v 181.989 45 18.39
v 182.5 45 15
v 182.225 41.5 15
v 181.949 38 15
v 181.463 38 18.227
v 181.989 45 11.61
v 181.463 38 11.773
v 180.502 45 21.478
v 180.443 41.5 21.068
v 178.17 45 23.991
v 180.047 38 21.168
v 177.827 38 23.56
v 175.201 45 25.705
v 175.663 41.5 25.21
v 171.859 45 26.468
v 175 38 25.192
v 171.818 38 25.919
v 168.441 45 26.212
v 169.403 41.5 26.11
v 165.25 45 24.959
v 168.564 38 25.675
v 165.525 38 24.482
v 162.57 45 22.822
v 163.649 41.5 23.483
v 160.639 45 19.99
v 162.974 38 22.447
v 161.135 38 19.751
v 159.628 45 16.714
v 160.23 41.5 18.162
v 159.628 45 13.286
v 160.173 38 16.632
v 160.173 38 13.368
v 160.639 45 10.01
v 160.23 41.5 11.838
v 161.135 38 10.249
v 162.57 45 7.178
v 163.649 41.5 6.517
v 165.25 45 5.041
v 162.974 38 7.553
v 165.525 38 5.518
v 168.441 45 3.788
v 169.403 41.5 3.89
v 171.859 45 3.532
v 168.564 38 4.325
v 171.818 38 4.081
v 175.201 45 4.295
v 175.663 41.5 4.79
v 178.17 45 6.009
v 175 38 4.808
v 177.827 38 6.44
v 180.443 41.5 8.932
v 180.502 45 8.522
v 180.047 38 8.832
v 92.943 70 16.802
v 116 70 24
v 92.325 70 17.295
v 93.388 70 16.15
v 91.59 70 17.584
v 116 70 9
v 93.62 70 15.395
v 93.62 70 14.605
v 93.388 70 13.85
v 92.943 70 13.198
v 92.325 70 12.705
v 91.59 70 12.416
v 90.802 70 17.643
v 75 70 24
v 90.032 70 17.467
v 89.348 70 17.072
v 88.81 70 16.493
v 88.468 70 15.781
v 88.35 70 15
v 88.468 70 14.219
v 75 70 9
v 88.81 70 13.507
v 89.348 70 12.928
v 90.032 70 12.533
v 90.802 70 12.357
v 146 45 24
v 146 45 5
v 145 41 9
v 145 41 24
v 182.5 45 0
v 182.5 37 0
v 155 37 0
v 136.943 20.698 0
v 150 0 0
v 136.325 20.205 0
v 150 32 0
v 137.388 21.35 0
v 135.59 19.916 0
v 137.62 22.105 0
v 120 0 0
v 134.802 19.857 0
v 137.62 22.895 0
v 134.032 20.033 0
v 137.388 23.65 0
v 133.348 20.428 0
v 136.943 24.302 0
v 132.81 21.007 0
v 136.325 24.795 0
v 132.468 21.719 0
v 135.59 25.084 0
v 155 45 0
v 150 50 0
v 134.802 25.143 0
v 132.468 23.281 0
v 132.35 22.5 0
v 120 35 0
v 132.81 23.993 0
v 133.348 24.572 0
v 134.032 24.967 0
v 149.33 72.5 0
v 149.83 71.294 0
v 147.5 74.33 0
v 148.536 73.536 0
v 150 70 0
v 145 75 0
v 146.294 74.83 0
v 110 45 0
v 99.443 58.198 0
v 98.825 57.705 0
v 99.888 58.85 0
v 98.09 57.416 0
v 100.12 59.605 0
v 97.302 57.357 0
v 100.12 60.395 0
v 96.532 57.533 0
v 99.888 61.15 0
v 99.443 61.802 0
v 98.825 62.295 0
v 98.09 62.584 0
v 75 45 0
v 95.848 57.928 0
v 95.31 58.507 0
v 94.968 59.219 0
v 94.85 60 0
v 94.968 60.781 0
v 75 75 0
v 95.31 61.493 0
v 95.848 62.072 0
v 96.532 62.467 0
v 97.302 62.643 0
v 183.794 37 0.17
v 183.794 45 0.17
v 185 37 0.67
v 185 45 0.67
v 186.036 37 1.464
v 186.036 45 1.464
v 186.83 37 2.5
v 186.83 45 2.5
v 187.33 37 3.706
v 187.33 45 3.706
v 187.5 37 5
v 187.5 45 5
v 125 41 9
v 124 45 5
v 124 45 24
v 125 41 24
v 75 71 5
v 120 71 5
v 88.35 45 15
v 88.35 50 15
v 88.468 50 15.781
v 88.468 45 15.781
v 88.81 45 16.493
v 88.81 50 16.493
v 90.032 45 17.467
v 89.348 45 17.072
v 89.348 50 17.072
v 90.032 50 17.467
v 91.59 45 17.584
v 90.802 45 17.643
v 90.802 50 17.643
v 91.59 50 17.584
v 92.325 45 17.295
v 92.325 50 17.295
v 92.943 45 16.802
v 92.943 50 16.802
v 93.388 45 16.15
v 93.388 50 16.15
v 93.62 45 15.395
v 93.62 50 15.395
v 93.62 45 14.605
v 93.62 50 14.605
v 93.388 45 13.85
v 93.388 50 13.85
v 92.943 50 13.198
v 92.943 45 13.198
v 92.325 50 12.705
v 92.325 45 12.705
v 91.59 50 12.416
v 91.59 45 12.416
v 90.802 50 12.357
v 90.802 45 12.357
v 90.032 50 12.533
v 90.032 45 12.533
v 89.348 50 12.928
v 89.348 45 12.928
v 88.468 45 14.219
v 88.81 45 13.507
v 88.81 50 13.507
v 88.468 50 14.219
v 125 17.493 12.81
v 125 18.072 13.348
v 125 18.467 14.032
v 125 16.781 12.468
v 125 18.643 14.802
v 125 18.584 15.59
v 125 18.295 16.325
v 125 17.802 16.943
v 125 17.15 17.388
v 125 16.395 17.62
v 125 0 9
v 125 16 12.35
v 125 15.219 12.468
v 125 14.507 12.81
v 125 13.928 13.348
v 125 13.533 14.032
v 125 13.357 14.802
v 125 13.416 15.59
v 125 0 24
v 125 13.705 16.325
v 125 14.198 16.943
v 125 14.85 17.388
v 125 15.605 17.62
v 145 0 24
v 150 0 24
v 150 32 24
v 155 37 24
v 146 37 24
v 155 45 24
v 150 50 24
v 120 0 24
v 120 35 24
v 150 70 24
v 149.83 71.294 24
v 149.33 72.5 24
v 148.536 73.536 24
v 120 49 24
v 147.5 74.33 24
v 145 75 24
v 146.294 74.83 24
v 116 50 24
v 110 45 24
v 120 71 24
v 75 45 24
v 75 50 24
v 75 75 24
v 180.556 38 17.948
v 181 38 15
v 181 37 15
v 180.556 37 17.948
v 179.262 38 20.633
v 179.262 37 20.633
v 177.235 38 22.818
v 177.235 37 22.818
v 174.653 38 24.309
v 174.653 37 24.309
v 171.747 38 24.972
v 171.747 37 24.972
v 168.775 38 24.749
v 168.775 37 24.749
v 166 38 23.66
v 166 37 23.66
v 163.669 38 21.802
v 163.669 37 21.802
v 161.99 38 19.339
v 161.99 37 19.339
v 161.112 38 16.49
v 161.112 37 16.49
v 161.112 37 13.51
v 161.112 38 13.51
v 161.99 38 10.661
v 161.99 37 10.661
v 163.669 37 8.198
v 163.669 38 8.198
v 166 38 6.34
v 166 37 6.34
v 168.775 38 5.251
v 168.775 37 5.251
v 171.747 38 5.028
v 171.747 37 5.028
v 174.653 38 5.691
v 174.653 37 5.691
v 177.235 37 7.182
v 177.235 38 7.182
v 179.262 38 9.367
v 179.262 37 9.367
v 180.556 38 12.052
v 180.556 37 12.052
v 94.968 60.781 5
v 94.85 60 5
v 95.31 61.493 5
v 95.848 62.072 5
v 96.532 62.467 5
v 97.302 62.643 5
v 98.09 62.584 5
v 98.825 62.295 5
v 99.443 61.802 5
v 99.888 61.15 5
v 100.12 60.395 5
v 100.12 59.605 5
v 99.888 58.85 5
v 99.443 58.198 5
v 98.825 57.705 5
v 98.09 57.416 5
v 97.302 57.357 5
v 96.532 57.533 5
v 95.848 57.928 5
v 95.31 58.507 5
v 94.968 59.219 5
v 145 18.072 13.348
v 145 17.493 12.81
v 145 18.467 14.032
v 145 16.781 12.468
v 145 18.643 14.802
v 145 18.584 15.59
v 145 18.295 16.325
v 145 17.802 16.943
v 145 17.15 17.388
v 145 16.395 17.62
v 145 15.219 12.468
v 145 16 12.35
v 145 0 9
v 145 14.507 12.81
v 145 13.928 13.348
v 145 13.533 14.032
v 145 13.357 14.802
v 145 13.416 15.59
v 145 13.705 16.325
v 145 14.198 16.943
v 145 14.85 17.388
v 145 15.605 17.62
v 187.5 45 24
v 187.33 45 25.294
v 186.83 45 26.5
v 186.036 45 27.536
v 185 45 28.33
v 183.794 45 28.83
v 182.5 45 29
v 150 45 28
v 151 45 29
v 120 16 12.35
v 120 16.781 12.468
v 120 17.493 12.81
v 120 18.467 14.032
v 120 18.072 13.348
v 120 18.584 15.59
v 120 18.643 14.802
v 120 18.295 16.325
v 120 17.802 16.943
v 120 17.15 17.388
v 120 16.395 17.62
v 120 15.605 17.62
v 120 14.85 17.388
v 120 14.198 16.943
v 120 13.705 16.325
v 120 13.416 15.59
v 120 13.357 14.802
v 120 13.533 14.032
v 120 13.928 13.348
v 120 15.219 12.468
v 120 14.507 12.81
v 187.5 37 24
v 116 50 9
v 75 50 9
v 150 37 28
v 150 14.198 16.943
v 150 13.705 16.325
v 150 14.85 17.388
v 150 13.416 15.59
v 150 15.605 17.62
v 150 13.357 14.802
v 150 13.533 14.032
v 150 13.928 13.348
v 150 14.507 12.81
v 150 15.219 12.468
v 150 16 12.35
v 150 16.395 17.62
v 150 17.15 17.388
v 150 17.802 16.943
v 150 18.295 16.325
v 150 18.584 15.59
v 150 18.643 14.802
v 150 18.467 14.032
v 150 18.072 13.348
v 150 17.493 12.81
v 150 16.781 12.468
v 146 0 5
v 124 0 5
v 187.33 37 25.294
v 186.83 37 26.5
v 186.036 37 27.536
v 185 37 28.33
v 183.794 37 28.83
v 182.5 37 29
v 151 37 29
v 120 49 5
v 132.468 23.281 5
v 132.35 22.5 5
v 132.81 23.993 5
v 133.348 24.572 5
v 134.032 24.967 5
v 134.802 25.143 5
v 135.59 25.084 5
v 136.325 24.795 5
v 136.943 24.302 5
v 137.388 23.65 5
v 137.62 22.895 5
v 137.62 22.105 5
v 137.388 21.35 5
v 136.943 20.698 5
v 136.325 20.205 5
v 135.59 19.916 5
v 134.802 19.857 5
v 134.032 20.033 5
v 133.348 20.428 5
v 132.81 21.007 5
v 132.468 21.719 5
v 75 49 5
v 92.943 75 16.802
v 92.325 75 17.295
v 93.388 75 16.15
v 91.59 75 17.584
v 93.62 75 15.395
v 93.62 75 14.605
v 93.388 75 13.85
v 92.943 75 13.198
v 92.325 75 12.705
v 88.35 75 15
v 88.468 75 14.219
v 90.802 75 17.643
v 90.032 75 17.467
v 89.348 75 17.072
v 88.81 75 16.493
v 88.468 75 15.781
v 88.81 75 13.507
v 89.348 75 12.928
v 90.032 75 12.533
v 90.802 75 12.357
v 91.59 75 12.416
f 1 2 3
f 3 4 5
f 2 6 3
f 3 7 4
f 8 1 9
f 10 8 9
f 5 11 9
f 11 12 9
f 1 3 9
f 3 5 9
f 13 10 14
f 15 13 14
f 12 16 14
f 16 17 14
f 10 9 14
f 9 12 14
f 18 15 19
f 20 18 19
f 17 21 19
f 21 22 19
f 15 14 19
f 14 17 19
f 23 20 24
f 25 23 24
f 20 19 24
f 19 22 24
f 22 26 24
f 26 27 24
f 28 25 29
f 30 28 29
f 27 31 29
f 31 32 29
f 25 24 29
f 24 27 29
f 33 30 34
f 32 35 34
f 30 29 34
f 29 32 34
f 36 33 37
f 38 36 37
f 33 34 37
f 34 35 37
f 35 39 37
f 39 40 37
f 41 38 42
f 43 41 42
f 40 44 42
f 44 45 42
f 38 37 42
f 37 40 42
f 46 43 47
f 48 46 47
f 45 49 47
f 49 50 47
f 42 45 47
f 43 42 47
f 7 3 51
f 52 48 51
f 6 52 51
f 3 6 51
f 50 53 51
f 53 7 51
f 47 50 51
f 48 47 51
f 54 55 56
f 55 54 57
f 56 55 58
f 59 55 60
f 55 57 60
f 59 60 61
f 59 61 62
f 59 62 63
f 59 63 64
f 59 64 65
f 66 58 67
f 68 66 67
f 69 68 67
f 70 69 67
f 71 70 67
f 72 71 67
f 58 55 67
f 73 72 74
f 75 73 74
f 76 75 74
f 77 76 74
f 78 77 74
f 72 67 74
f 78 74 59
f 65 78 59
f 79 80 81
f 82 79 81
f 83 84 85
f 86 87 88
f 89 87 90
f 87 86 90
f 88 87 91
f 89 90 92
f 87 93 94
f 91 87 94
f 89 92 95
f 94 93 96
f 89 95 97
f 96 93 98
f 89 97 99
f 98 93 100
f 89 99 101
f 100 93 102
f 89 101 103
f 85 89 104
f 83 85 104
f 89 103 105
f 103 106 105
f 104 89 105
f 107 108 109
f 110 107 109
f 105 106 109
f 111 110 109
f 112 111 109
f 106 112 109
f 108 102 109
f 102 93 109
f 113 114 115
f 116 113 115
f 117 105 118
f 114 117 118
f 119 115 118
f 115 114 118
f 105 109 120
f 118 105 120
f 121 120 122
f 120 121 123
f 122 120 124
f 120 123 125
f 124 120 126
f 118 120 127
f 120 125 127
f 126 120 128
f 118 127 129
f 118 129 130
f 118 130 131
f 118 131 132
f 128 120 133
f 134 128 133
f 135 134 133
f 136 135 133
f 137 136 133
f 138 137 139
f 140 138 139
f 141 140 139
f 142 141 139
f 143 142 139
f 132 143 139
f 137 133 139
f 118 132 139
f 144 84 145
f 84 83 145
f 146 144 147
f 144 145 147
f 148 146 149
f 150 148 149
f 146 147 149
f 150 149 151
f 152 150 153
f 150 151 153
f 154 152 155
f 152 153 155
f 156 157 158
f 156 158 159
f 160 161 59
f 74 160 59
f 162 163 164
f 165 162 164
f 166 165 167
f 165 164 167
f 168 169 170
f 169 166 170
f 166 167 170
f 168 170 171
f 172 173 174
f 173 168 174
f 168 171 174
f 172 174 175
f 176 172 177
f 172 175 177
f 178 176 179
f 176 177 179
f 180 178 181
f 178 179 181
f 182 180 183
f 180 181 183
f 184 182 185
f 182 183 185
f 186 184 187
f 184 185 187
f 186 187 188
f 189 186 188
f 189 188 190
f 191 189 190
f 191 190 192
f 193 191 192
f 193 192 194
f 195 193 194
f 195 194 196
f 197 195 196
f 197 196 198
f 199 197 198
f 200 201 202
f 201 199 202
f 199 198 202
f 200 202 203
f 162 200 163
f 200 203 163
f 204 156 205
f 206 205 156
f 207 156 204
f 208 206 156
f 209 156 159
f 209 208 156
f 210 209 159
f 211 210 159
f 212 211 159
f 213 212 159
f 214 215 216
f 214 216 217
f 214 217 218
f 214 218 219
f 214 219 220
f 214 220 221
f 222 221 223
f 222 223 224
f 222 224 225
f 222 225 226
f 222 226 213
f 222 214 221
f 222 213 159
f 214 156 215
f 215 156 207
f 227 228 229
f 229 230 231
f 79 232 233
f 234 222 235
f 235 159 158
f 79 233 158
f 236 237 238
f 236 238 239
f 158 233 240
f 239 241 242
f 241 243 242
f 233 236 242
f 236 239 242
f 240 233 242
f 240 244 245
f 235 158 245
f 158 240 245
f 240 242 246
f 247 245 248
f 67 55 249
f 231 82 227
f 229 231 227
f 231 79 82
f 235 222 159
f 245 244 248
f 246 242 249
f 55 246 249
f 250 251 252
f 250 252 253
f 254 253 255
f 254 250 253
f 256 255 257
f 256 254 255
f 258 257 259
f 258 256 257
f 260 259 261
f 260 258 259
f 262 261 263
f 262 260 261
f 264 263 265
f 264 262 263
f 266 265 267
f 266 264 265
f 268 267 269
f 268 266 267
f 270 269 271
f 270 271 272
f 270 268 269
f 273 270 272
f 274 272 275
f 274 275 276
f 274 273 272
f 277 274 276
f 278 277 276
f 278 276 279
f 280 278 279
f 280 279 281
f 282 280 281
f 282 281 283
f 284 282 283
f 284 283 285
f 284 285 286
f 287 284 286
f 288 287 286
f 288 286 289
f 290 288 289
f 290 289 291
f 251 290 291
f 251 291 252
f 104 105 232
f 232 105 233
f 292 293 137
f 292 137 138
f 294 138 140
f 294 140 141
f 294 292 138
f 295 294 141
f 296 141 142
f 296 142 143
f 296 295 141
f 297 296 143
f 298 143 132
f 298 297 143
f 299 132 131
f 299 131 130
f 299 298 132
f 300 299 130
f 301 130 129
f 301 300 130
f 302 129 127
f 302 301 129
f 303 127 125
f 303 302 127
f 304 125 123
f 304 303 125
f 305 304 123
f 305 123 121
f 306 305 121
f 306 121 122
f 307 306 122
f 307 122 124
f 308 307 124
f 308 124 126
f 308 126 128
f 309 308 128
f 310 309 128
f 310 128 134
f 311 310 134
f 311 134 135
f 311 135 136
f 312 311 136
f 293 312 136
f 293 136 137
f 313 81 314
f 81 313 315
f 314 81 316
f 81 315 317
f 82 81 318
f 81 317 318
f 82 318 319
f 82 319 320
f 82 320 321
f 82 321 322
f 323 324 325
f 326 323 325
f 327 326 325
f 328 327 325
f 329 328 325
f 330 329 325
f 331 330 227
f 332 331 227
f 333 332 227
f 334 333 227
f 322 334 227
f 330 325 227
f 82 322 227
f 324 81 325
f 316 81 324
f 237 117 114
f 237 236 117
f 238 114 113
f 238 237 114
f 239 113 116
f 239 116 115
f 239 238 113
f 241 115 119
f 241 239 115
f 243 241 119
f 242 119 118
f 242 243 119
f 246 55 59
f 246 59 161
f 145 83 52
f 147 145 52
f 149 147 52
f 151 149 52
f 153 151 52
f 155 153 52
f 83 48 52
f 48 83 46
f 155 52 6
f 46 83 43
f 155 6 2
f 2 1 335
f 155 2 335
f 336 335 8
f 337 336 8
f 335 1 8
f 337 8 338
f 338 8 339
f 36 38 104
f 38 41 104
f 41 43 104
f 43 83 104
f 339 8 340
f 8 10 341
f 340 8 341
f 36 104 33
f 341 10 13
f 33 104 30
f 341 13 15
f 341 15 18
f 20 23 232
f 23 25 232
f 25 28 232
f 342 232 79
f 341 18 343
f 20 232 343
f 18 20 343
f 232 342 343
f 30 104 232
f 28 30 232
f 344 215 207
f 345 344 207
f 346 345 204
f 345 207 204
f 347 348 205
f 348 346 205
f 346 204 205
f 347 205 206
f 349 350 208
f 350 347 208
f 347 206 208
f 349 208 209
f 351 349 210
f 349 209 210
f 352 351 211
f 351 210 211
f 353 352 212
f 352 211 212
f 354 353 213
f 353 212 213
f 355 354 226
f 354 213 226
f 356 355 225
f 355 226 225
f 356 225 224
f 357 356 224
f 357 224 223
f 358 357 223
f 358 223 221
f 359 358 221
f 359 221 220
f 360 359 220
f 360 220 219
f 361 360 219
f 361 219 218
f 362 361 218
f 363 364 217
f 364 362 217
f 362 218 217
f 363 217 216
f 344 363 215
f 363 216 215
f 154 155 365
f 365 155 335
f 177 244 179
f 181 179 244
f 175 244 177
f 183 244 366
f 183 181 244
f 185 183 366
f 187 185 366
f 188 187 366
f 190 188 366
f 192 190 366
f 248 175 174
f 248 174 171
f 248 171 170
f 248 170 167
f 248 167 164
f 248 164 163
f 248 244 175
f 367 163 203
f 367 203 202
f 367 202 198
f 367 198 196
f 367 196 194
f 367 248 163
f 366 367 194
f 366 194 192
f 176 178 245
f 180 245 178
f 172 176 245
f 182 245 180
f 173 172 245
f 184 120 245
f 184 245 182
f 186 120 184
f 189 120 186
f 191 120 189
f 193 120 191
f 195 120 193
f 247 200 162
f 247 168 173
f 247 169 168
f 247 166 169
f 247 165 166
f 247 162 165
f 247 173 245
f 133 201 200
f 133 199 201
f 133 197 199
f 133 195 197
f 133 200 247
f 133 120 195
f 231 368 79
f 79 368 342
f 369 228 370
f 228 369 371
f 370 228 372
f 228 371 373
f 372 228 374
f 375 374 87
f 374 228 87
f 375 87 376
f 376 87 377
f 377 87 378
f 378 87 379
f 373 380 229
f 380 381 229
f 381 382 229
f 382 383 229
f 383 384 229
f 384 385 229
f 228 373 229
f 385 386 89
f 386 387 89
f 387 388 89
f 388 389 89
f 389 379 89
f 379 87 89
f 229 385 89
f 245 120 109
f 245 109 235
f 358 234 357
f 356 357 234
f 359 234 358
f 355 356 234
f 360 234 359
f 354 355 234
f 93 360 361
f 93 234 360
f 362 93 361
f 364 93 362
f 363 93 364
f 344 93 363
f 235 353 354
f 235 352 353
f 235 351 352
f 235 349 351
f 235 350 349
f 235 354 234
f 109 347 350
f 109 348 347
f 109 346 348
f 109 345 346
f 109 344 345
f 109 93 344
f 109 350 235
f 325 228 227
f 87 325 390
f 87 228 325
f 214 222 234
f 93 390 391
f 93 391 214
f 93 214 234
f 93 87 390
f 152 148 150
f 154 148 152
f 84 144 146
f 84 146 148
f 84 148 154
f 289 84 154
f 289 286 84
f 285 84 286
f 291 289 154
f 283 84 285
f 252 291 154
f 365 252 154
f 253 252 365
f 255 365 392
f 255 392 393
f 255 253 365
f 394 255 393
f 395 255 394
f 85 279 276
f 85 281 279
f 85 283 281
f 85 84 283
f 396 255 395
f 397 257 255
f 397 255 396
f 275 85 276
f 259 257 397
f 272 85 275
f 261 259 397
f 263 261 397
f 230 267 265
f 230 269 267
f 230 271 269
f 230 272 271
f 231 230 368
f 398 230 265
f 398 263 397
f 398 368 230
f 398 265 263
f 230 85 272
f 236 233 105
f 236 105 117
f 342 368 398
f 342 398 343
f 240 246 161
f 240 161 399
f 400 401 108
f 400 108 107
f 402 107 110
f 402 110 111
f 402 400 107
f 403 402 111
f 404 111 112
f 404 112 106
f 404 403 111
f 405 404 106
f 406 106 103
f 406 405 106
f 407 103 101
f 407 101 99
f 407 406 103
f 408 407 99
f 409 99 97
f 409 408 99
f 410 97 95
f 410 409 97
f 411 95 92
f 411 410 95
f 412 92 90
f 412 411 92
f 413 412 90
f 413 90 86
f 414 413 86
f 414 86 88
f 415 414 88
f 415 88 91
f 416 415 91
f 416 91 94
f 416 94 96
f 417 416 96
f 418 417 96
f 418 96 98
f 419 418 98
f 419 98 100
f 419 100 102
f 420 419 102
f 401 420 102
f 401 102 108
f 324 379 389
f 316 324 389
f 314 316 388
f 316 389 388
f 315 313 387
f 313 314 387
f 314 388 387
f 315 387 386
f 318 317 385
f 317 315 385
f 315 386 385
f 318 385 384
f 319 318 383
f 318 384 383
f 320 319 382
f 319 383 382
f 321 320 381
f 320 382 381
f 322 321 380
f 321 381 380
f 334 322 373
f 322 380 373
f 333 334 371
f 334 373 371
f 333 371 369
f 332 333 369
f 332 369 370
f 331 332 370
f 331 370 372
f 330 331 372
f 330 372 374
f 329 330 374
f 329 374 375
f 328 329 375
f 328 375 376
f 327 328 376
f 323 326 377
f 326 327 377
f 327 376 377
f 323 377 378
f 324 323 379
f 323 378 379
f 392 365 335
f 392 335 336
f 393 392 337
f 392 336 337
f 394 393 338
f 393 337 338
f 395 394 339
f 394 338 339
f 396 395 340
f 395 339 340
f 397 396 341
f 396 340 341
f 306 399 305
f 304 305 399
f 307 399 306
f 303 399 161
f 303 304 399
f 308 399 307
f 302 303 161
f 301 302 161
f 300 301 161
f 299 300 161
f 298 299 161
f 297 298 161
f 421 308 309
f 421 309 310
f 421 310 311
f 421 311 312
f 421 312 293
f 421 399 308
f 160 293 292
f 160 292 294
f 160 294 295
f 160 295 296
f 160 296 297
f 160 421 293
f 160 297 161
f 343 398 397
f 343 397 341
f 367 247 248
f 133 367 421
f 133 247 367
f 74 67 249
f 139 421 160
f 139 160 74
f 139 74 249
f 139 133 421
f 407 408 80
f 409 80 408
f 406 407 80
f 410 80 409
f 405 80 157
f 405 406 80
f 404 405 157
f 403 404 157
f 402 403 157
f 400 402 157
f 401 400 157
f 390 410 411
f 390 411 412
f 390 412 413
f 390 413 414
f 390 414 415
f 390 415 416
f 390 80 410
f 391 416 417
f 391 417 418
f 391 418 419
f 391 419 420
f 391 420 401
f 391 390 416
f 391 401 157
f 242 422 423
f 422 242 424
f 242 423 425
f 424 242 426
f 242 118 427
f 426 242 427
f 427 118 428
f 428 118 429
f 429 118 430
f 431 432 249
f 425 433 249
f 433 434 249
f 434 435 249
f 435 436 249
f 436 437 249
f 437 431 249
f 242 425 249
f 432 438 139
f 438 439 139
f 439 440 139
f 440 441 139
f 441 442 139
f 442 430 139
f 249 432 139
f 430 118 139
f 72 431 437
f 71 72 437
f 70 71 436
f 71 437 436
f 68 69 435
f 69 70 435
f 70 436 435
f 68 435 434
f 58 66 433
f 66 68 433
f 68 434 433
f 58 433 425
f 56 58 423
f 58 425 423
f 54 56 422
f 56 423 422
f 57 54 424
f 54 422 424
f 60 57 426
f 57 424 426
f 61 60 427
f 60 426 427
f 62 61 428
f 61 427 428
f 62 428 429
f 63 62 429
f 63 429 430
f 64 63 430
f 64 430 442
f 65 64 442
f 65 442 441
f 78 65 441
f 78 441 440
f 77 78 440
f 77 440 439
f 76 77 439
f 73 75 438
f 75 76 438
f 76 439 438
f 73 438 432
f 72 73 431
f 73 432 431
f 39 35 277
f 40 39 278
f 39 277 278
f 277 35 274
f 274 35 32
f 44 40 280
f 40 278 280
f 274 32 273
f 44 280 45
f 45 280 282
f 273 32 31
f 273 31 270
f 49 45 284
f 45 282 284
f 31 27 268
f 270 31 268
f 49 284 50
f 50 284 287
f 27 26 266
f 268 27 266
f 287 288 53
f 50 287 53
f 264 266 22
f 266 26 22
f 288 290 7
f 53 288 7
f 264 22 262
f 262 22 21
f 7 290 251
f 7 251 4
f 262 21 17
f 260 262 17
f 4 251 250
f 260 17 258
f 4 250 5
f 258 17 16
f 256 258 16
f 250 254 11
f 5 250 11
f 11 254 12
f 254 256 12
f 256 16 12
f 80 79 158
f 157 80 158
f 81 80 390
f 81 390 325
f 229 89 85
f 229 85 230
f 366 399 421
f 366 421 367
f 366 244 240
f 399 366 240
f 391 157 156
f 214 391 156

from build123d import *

# Parameters (mm, degrees)
SKETCH1_W               = 75
SKETCH1_H               = 75
BOSS_EXTRUDE1_DEPTH     = 24
SKETCH2_W               = 20
SKETCH2_H               = 19
CUT_EXTRUDE1_DEPTH      = 45
SKETCH3_W               = 19
SKETCH3_H               = 20
CUT_EXTRUDE2_DEPTH      = 45
CUT_EXTRUDE3_DEPTH      = 109.747413762
CUT_EXTRUDE3_DEPTH_BACK = 109.747413762
SKETCH4_W               = 45
SKETCH4_H               = 45
FILLET1_R               = 5
CHAMFER1_SIZE           = 10
SKETCH5_W               = 29
SKETCH5_H               = 8
BOSS_EXTRUDE2_DEPTH     = 37.5
SKETCH6_R               = 11.5
CUT_EXTRUDE4_DEPTH      = 7
FILLET2_R               = 5
CHAMFER3_SIZE           = 5
CUT_EXTRUDE5_DEPTH      = 93.146622293
CUT_EXTRUDE5_DEPTH_BACK = 93.146622293
SKETCH7_R               = 2.65
CUT_EXTRUDE6_DEPTH      = 105.986903945
CUT_EXTRUDE6_DEPTH_BACK = 105.986903945
SKETCH8_R               = 2.65
SKETCH9_R               = 2.65
CUT_EXTRUDE7_DEPTH      = 10
SKETCH10_R              = 2.65
CUT_EXTRUDE8_DEPTH      = 10
CUT_EXTRUDE12_DEPTH     = 19
CUT_EXTRUDE13_REACH     = 111.959
CUT_EXTRUDE14_REACH     = 140.283
SKETCH14_R              = 10
CUT_EXTRUDE15_DEPTH     = 10
CHAMFER5_SIZE           = 4
CHAMFER6_SIZE           = 1
CHAMFER8_SIZE2          = 0.550911948
CHAMFER8_SIZE           = 7


with BuildPart() as part:
    # Sketch1 → Boss-Extrude1 (new body)
    with BuildSketch(Plane.XY):
        with Locations((37.5, 37.5)):
            Rectangle(SKETCH1_W, SKETCH1_H)
    extrude(amount=BOSS_EXTRUDE1_DEPTH)

    # Sketch2 → Cut-Extrude1 (cut)
    with BuildSketch(Plane.XZ):
        with Locations((15, 14.5)):
            Rectangle(SKETCH2_W, SKETCH2_H)
    extrude(amount=-CUT_EXTRUDE1_DEPTH, mode=Mode.SUBTRACT)

    # Sketch3 → Cut-Extrude2 (cut)
    with BuildSketch(Plane(origin=(75, 0, 0), x_dir=(0, 0, -1), z_dir=(1, 0, 0))):
        with Locations((-14.5, 60)):
            Rectangle(SKETCH3_W, SKETCH3_H)
    extrude(amount=-CUT_EXTRUDE2_DEPTH, mode=Mode.SUBTRACT)

    # Sketch4 → Cut-Extrude3 (cut, two sides: drawn at the far end of the back side and taken through both)
    with BuildSketch(Plane.XY.offset(24).offset(-CUT_EXTRUDE3_DEPTH_BACK)):
        with Locations((52.5, 22.5)):
            Rectangle(SKETCH4_W, SKETCH4_H)
    extrude(amount=CUT_EXTRUDE3_DEPTH + CUT_EXTRUDE3_DEPTH_BACK, mode=Mode.SUBTRACT)

    # Fillet1
    fillet1_edges = [part.edges().sort_by_distance(p)[0] for p in [
        (0, 75, 12),
    ]]
    fillet(fillet1_edges, radius=FILLET1_R)

    # Chamfer1
    chamfer1_edges = [part.edges().sort_by_distance(p)[0] for p in [
        (30, 45, 12),
    ]]
    chamfer(chamfer1_edges, length=CHAMFER1_SIZE)

    # Sketch5 → Boss-Extrude2 (add)
    with BuildSketch(Plane.ZY):
        with Locations((14.5, 41)):
            Rectangle(SKETCH5_W, SKETCH5_H)
    extrude(amount=BOSS_EXTRUDE2_DEPTH)

    # Sketch6 → Cut-Extrude4 (cut)
    with BuildSketch(Plane(origin=(0, 45, 0), x_dir=(1, 0, 0), z_dir=(0, 1, 0))):
        with Locations(Location((-21, -15.000000001, 0), (0, 0, 180))):
            Circle(SKETCH6_R)
    extrude(amount=-CUT_EXTRUDE4_DEPTH, mode=Mode.SUBTRACT)

    # Fillet2
    fillet2_edges = [part.edges().sort_by_distance(p)[0] for p in [
        (-37.5, 41, 29),
        (-37.5, 41, 0),
    ]]
    fillet(fillet2_edges, radius=FILLET2_R)

    # Chamfer3
    chamfer3_edges = [part.edges().sort_by_distance(p)[0] for p in [
        (0, 45, 12),
        (0, 37, 12),
    ]]
    chamfer(chamfer3_edges, length=CHAMFER3_SIZE)

    # Sketch7 → Cut-Extrude5 (cut, two sides: drawn at the far end of the back side and taken through both)
    with BuildSketch(Plane.XZ.offset(-45).offset(-CUT_EXTRUDE5_DEPTH_BACK)):
        with Locations((59, 15)):
            Circle(SKETCH7_R)
    extrude(amount=CUT_EXTRUDE5_DEPTH + CUT_EXTRUDE5_DEPTH_BACK, mode=Mode.SUBTRACT)

    # Sketch8 → Cut-Extrude6 (cut, two sides: drawn at the far end of the back side and taken through both)
    with BuildSketch(Plane(origin=(30, 0, 0), x_dir=(0, 0, -1), z_dir=(1, 0, 0)).offset(-CUT_EXTRUDE6_DEPTH_BACK)):
        with Locations((-15, 16)):
            Circle(SKETCH8_R)
    extrude(amount=CUT_EXTRUDE6_DEPTH + CUT_EXTRUDE6_DEPTH_BACK, mode=Mode.SUBTRACT)

    # Sketch9 → Cut-Extrude7 (cut)
    with BuildSketch(Plane.XY.offset(5)):
        with Locations((15, 22.5)):
            Circle(SKETCH9_R)
    extrude(amount=-CUT_EXTRUDE7_DEPTH, mode=Mode.SUBTRACT)

    # Sketch10 → Cut-Extrude8 (cut)
    with BuildSketch(Plane.XY.offset(5)):
        with Locations((52.5, 60)):
            Circle(SKETCH10_R)
    extrude(amount=-CUT_EXTRUDE8_DEPTH, mode=Mode.SUBTRACT)

    # Sketch11 → Cut-Extrude12 (cut)
    with BuildSketch(Plane.XY.offset(24)):
        Polygon((34, 70), (30, 71), (30, 70), align=None)
        Polygon((30, 50), (34, 50), (30, 49), align=None)
        Polygon((26, 45), (25, 41), (25, 45), align=None)
        Polygon((5, 45), (4, 45), (5, 41), align=None)
    extrude(amount=-CUT_EXTRUDE12_DEPTH, mode=Mode.SUBTRACT)

    # Cut-Extrude13: up to this face of the body (flat: up to its plane)
    cut_extrude13_end = Plane(part.part.faces().sort_by_distance((15, 45, 14.5))[0])
    # Sketch12 → Cut-Extrude13 (cut, up to the picked face)
    with BuildSketch(Plane.XZ, mode=Mode.PRIVATE) as cut_extrude13_sk1:
        Polygon((5, 5), (4, 5), (5, 9), align=None)
    cut_extrude13_tool1 = split(extrude(cut_extrude13_sk1.sketch, amount=-CUT_EXTRUDE13_REACH, mode=Mode.PRIVATE), bisect_by=cut_extrude13_end, keep=Keep.BOTH, mode=Mode.PRIVATE)
    # Sketch12 → Cut-Extrude13 (cut, up to the picked face)
    with BuildSketch(Plane.XZ, mode=Mode.PRIVATE) as cut_extrude13_sk2:
        Polygon((25, 5), (26, 5), (25, 9), align=None)
    cut_extrude13_tool2 = split(extrude(cut_extrude13_sk2.sketch, amount=-CUT_EXTRUDE13_REACH, mode=Mode.PRIVATE), bisect_by=cut_extrude13_end, keep=Keep.BOTH, mode=Mode.PRIVATE)
    add(cut_extrude13_tool1.solids().sort_by(Axis((4.666667, 0, 6.333333), (0, 1, 0)))[0], mode=Mode.SUBTRACT)
    add(cut_extrude13_tool2.solids().sort_by(Axis((25.333333, 0, 6.333333), (0, 1, 0)))[0], mode=Mode.SUBTRACT)

    # Cut-Extrude14: up to this face of the body (flat: up to its plane)
    cut_extrude14_end = Plane(part.part.faces().sort_by_distance((30, 60, 14.5))[0])
    # Sketch13 → Cut-Extrude14 (cut, up to the picked face)
    with BuildSketch(Plane(origin=(75, 0, 0), x_dir=(0, 0, -1), z_dir=(1, 0, 0)), mode=Mode.PRIVATE) as cut_extrude14_sk1:
        Polygon((-5, 50), (-5, 49), (-9, 50), align=None)
    cut_extrude14_tool1 = split(extrude(cut_extrude14_sk1.sketch, amount=-CUT_EXTRUDE14_REACH, mode=Mode.PRIVATE), bisect_by=cut_extrude14_end, keep=Keep.BOTH, mode=Mode.PRIVATE)
    # Sketch13 → Cut-Extrude14 (cut, up to the picked face)
    with BuildSketch(Plane(origin=(75, 0, 0), x_dir=(0, 0, -1), z_dir=(1, 0, 0)), mode=Mode.PRIVATE) as cut_extrude14_sk2:
        Polygon((-5, 70), (-5, 71), (-9, 70), align=None)
    cut_extrude14_tool2 = split(extrude(cut_extrude14_sk2.sketch, amount=-CUT_EXTRUDE14_REACH, mode=Mode.PRIVATE), bisect_by=cut_extrude14_end, keep=Keep.BOTH, mode=Mode.PRIVATE)
    add(cut_extrude14_tool1.solids().sort_by(Axis((75, 49.666667, 6.333333), (-1, 0, 0)))[0], mode=Mode.SUBTRACT)
    add(cut_extrude14_tool2.solids().sort_by(Axis((75, 70.333333, 6.333333), (-1, 0, 0)))[0], mode=Mode.SUBTRACT)

    # Sketch14 → Cut-Extrude15 (cut)
    with BuildSketch(Plane(origin=(0, 38, 0), x_dir=(1, 0, 0), z_dir=(0, 1, 0))):
        with Locations(Location((-21, -15.000000001, 0), (0, 0, 180))):
            Circle(SKETCH14_R)
    extrude(amount=-CUT_EXTRUDE15_DEPTH, mode=Mode.SUBTRACT)

    # Chamfer5
    chamfer5_edges = [part.edges().sort_by_distance(p)[0] for p in [
        (0, 41, 24),
    ]]
    chamfer(chamfer5_edges, length=CHAMFER5_SIZE)

    # Chamfer6
    chamfer6_edges = [part.edges().sort_by_distance(p)[0] for p in [
        (0, 41, 29),
    ]]
    chamfer(chamfer6_edges, length=CHAMFER6_SIZE - 0.0001)  # a hair under: the kernel refuses the full size

    # Chamfer8
    chamfer8_edges = [part.edges().sort_by_distance(p)[0] for p in [
        (-9.5, 38, 15.000000001),
    ]]
    chamfer8_side = [part.faces().sort_by_distance(p)[0] for p in [
        (-9.5, 38.011018239, 15.000000001),
    ]]
    chamfer(chamfer8_edges, length=CHAMFER8_SIZE - 0.0001, length2=CHAMFER8_SIZE2 - 0.0001, reference=chamfer8_side[0])  # a hair under: the kernel refuses the full size


with BuildPart() as body_2:
    # Mirror1: mirrored copy
    add(part.part.mirror(Plane(origin=(75, 0, 24), x_dir=(0, 0, 1), z_dir=(-1, 0, 0))))


solid = body_2.part
